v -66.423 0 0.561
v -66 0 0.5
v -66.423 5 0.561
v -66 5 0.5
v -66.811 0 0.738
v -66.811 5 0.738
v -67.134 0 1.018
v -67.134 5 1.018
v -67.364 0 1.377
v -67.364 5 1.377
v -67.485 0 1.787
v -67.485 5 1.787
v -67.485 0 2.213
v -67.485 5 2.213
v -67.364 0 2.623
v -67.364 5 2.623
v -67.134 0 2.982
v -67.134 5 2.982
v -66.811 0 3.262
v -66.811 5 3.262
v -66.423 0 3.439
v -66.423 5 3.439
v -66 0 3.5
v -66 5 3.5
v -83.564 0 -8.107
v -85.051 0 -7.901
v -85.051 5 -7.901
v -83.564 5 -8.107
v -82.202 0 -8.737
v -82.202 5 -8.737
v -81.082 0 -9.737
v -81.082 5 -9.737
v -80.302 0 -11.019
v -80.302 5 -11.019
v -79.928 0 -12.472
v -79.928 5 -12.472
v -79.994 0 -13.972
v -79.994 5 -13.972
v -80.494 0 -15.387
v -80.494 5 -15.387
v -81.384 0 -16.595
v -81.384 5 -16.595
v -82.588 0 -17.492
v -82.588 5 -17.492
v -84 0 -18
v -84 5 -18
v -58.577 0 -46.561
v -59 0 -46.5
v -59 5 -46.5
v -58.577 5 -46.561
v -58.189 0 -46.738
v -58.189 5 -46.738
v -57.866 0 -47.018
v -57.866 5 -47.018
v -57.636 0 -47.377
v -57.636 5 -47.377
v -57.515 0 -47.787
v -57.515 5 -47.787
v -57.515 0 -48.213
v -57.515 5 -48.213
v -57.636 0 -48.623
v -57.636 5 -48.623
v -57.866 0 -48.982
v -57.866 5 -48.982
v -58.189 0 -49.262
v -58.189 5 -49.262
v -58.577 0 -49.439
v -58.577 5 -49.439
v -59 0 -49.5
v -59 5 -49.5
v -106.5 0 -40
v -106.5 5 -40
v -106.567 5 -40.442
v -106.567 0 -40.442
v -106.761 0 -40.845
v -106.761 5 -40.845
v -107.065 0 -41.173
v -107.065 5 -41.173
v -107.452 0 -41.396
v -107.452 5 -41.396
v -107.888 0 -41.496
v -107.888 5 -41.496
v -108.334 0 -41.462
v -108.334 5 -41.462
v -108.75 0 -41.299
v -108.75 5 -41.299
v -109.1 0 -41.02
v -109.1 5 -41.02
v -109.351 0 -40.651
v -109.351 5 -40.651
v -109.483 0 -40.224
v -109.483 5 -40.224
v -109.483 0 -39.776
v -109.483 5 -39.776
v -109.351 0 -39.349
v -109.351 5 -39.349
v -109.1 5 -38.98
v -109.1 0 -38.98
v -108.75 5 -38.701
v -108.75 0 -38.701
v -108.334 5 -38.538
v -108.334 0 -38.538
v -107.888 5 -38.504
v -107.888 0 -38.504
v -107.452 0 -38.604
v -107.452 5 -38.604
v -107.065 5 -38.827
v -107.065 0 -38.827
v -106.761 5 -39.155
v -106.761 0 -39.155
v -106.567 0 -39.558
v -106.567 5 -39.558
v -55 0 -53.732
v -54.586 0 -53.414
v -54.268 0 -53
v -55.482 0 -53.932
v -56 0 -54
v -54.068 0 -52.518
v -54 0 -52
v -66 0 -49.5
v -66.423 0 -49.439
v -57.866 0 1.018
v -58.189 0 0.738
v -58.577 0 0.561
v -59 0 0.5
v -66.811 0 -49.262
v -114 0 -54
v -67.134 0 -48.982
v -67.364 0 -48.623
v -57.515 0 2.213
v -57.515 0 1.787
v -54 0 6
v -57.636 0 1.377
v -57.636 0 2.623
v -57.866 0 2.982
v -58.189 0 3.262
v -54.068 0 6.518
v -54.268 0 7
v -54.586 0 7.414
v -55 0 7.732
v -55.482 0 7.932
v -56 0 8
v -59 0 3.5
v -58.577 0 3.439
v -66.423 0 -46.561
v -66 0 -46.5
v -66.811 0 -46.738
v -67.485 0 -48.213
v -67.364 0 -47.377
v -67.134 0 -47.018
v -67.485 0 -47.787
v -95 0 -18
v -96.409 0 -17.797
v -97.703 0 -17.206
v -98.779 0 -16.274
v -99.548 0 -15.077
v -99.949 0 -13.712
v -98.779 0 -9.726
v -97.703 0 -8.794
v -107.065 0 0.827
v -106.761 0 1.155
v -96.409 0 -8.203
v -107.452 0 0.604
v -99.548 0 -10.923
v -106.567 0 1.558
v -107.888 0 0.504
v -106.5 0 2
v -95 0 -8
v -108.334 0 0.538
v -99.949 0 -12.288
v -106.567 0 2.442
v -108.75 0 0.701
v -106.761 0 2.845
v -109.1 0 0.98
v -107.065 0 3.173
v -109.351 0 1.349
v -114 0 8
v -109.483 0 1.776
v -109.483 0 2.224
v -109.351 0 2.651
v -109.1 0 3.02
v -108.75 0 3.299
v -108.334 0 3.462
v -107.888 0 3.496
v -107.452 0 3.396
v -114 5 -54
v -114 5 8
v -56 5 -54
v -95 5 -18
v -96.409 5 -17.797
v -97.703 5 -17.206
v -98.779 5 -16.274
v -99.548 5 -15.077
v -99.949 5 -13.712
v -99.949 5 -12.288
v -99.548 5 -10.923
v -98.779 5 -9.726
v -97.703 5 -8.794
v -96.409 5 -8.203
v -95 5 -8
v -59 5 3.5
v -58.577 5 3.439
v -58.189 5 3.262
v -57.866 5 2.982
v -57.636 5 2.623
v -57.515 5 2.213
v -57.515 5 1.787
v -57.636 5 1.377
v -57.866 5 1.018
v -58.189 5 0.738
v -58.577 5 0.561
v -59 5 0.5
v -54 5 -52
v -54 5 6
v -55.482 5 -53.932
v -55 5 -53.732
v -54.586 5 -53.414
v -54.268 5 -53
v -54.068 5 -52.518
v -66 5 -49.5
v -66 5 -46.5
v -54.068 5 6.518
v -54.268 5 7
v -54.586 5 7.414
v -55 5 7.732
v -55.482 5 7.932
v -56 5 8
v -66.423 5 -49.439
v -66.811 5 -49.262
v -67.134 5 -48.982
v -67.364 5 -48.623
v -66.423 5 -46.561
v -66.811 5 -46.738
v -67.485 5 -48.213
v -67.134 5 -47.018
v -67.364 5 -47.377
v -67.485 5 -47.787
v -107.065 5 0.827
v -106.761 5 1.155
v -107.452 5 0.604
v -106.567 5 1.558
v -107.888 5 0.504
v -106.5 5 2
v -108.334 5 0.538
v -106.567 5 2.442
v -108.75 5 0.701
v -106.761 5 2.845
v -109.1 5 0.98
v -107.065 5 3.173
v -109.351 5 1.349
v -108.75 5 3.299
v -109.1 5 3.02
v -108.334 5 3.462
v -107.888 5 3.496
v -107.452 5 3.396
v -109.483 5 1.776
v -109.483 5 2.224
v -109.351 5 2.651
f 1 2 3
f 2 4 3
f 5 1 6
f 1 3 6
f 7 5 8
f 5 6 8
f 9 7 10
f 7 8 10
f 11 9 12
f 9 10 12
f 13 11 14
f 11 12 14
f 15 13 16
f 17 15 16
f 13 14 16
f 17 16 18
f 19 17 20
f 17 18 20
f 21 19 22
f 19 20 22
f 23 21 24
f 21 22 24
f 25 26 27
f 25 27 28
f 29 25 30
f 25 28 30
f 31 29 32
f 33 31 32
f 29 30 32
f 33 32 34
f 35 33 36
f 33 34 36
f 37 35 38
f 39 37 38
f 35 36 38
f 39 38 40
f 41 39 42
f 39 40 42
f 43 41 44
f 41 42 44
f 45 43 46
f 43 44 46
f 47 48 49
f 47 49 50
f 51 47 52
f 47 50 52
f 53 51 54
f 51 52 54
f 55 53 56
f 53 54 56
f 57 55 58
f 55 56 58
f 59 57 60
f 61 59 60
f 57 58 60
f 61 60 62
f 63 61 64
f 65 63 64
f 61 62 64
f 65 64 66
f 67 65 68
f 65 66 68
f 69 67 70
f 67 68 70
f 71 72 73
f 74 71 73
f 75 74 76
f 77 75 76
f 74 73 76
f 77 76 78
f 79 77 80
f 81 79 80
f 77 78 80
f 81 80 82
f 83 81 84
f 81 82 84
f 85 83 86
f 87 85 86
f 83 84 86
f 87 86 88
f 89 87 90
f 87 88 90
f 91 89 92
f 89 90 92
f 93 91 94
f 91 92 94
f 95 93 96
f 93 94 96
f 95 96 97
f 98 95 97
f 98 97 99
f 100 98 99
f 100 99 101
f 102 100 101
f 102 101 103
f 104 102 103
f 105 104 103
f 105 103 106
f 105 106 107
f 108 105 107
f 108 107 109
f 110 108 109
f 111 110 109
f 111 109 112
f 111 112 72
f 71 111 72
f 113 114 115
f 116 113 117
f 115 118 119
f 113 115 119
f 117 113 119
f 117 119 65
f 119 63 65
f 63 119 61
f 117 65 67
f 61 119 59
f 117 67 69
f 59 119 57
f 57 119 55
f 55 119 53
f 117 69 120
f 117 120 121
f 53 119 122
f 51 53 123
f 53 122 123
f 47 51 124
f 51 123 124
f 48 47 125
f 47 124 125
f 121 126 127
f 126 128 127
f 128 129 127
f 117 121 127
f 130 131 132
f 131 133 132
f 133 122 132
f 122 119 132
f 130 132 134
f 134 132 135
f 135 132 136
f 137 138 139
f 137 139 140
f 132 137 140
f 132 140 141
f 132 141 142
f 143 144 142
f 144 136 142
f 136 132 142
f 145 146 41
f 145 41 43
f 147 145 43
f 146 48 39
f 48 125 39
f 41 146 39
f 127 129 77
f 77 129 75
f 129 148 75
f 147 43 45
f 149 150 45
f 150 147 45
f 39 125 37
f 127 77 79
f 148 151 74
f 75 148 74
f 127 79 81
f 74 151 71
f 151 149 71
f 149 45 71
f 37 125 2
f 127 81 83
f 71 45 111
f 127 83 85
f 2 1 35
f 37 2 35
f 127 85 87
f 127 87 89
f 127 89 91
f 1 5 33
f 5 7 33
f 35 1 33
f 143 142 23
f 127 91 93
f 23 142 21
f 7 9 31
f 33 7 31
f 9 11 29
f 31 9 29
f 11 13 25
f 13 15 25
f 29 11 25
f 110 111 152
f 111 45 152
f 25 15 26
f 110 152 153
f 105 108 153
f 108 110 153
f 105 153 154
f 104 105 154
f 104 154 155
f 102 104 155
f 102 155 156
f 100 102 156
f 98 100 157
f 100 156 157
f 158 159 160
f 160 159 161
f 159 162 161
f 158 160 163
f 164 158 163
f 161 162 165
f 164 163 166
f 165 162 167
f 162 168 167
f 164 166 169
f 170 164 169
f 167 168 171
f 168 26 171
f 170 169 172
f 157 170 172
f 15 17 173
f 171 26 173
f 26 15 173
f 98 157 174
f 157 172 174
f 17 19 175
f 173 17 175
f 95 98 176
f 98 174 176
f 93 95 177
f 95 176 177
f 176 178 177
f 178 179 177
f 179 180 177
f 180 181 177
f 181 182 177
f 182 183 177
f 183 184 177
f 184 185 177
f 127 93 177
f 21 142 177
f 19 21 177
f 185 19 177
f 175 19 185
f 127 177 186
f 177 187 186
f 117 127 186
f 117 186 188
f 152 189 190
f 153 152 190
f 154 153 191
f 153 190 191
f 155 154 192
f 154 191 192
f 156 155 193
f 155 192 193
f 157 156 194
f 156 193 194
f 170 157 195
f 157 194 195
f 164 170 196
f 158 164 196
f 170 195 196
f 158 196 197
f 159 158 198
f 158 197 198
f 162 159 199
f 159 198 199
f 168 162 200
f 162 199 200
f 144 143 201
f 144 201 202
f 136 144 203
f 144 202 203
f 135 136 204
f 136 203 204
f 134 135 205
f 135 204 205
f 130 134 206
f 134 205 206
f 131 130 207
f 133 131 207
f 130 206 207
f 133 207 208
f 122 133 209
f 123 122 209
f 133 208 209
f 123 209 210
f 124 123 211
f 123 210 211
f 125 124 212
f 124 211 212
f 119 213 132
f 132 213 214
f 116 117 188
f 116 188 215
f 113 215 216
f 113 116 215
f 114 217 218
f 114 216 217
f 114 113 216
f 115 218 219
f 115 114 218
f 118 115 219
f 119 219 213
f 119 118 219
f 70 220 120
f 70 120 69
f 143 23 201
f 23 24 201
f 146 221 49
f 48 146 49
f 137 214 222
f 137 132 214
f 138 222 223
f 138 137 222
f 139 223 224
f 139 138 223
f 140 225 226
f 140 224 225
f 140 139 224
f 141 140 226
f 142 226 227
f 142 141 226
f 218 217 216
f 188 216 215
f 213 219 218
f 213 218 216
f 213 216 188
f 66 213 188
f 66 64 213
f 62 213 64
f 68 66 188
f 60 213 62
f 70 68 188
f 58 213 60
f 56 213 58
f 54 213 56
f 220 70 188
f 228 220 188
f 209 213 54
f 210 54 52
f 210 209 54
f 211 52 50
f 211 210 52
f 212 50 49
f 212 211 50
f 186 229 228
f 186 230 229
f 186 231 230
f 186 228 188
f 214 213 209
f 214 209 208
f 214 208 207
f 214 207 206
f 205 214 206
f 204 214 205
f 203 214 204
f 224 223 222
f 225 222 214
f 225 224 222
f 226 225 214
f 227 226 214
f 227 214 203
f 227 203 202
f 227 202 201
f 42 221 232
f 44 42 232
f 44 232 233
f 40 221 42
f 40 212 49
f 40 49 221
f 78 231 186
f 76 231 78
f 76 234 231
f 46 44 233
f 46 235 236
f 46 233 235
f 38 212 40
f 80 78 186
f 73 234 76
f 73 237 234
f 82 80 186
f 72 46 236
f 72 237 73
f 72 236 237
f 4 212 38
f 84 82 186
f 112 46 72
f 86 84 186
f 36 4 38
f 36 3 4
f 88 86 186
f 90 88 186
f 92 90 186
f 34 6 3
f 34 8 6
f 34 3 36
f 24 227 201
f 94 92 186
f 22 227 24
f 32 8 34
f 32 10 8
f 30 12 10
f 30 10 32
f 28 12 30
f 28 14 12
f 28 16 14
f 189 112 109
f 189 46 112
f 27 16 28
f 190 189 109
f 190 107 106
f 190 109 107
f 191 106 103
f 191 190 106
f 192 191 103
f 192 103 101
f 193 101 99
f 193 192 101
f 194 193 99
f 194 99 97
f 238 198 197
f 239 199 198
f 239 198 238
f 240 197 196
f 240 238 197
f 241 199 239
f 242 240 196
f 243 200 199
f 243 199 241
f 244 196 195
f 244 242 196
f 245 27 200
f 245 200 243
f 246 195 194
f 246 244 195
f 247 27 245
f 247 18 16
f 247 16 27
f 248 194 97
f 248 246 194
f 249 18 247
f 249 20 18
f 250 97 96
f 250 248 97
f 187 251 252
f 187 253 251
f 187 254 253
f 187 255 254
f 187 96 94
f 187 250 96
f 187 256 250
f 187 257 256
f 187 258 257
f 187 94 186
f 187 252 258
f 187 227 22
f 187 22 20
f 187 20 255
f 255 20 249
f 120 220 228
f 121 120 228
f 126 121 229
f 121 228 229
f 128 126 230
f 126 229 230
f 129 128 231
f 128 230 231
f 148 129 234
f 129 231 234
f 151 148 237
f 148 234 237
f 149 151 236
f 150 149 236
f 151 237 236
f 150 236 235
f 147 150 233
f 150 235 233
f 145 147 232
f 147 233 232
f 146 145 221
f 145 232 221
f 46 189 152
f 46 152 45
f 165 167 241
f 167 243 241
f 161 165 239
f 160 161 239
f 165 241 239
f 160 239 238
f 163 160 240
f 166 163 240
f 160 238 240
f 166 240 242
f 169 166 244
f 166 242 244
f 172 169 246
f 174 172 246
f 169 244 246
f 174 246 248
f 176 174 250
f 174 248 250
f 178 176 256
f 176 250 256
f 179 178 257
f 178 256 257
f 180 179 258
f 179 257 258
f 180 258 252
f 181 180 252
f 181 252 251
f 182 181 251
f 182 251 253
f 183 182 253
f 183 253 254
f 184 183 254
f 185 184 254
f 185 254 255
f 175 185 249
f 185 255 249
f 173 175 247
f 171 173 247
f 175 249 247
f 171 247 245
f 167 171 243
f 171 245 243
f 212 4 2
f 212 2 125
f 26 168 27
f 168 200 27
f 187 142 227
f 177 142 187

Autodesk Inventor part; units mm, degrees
ref_plane "YZ Plane" through (0, 0, 0) normal (1, 0, 0) x (0, 1, 0)
ref_plane "XZ Plane" through (0, 0, 0) normal (0, 1, 0) x (-1, 0, 0)
ref_plane "XY Plane" through (0, 0, 0) normal (0, 0, 1) x (1, 0, 0)
sketch "Sketch1" plane through (0, 0, 0) normal (0, 1, 0) x (-1, 0, 0)
  line L0 (0, 0) -> (46, 0) construction
  line L1 (46, 0) -> (46, -46) construction
  line L2 (46, -46) -> (0, -46) construction
  line L3 (0, -46) -> (0, 0) construction
  circle A0 centre (46, -46) radius 1.5
  circle A1 centre (46, 0) radius 1.5
  circle A2 centre (0, 0) radius 1.5
  circle A3 centre (0, -46) radius 1.5
  line L4 (23, 0) -> (23, -46) construction
  line L5 (-8, 8) -> (54, 8)
  line L6 (54, 8) -> (54, -54)
  line L7 (54, -54) -> (-8, -54)
  line L8 (-8, -54) -> (-8, 8)
  line L9 (-8, 8) -> (54, -54) construction
  line L10 (54, 8) -> (-8, -54) construction
  point P0 (23, -23)
  dimension "d0" = 46
  dimension "d1" = 46
  dimension "d2" = 3
  dimension "d3" = 3
  dimension "d4" = 3
  dimension "d5" = 3
  dimension "d6" = 8
  dimension "d7" = 8
extrude "Extrusion1" add sketch "Sketch1" along normal blind 5
sketch "Sketch2" plane through (0, 5, 0) normal (0, 1, 0) x (1, 0, 0)
  line L0 (-54, -8) -> (8, -8) projected
  line L1 (-54, -8) -> (-114, -8)
  line L2 (-114, -8) -> (-114, 54)
  line L3 (-114, 54) -> (-54, 54)
  line L4 (-54, 54) -> (-54, -8)
  line L5 (8, 54) -> (-54, 54) projected
  point P0 (0, 0)
  dimension "d10" = 60
extrude "Extrusion2" add sketch "Sketch2" against normal blind 5
sketch "Sketch3" plane through (0, 5, 0) normal (0, 1, 0) x (1, 0, 0)
  circle A0 centre (0, 46) radius 1.5 projected
  circle A1 centre (-46, 46) radius 1.5 projected
  line L0 (0, 46) -> (-46, 46) construction
  line L1 (-23, 46) -> (-23, 0) construction
  line L2 (-1.5, 44.5) -> (-44.5, 44.5)
  line L3 (-44.5, 44.5) -> (-44.5, 1.5)
  line L4 (-44.5, 1.5) -> (-1.5, 1.5)
  line L5 (-1.5, 1.5) -> (-1.5, 44.5)
  line L6 (-1.5, 44.5) -> (-44.5, 1.5) construction
  line L7 (-44.5, 44.5) -> (-1.5, 1.5) construction
  line L8 (-114, -8) -> (8, -8) projected
  point P0 (0, 0)
  point P1 (-23, 23)
  dimension "d14" = 43
  dimension "d15" = 43
extrude "Extrusion3" cut sketch "Sketch3" against normal blind 5 contours L5 L4 L3 L2
fillet "Fillet1" radius 1 4 edges at (-44.5, 2.5, -44.5) (-44.5, 2.5, -1.5) (-1.5, 2.5, -1.5) (-1.5, 2.5, -44.5)
sketch "Sketch4" plane through (0, 5, 0) normal (0, 1, 0) x (1, 0, 0)
  circle A0 centre (-108, 40) radius 1.5
  circle A1 centre (-108, -2) radius 1.5
  line L0 (-114, -8) -> (8, -8) projected
  line L1 (-114, 54) -> (-114, -8) projected
  line L2 (8, 54) -> (-114, 54) projected
  circle A2 centre (-59, -2) radius 1.5
  circle A3 centre (-59, 48) radius 1.5
  circle A4 centre (-66, -2) radius 1.5
  circle A5 centre (-66, 48) radius 1.5
  line L3 (-59, -2) -> (-59, 48) construction
  line L4 (-66, 46.5) -> (-59, 46.5)
  line L5 (-66, 49.5) -> (-59, 49.5)
  line L6 (-66, -3.5) -> (-59, -3.5)
  line L7 (-66, -0.5) -> (-59, -0.5)
  line L8 (-66, -2) -> (-66, 48) construction
  line L9 (-59, -2) -> (-66, -2) construction
  line L10 (-59, 48) -> (-66, 48) construction
  point P0 (0, 0)
  dimension "d19" = 6
  dimension "d20" = 3
  dimension "d21" = 6
  dimension "d23" = 3
  dimension "d24" = 6
  dimension "d25" = 14
  dimension "d26" = 3
  dimension "d27" = 3
  dimension "d28" = 50
  dimension "d29" = 6
  dimension "d32" = 7
  dimension "d33" = 3
  dimension "d34" = 3
  dimension "d35" = 7
  dimension "d36" = 42
extrude "Extrusion4" cut sketch "Sketch4" against normal blind 5
fillet "Fillet2" [suppressed]
sketch "Sketch5" plane through (0, 5, 0) normal (0, 1, 0) x (1, 0, 0)
  line L0 (-114, -8) -> (8, -8) projected
  line L1 (8, 54) -> (-54, 54)
  line L2 (-54, 54) -> (-54, -8)
  line L3 (-54, -8) -> (8, -8)
  line L4 (8, -8) -> (8, 54)
  line L5 (-114, 54) -> (-114, -8) projected
  point P0 (0, 0)
  point P1 (8, -8)
  dimension "d42" = 60
extrude "Extrusion5" cut sketch "Sketch5" against normal blind 10
sketch "Sketch6" plane through (0, 5, 0) normal (0, 1, 0) x (1, 0, 0)
  circle A0 centre (-95, 13) radius 5
  circle A1 centre (-108, 40) radius 1.5 projected
  circle A2 centre (-85, 13) radius 5.099
  line L0 (-95, 18) -> (-84, 18)
  line L1 (-95, 8) -> (-85.0506, 7.9012)
  point P0 (0, 0)
  dimension "d45" = 27
  dimension "d46" = 13
  dimension "d47" = 10
  dimension "d48" = 10
extrude "Extrusion6" cut sketch "Sketch6" against normal blind 10 contours A0 A2 | L0 A2 A0 | A0 A2 L1 | A2 L0 A0 | A0 A2
fillet "Fillet3" radius 2 2 edges at (-54, 2.5, 8) (-54, 2.5, -54)
properties part number "Electronics cover"
